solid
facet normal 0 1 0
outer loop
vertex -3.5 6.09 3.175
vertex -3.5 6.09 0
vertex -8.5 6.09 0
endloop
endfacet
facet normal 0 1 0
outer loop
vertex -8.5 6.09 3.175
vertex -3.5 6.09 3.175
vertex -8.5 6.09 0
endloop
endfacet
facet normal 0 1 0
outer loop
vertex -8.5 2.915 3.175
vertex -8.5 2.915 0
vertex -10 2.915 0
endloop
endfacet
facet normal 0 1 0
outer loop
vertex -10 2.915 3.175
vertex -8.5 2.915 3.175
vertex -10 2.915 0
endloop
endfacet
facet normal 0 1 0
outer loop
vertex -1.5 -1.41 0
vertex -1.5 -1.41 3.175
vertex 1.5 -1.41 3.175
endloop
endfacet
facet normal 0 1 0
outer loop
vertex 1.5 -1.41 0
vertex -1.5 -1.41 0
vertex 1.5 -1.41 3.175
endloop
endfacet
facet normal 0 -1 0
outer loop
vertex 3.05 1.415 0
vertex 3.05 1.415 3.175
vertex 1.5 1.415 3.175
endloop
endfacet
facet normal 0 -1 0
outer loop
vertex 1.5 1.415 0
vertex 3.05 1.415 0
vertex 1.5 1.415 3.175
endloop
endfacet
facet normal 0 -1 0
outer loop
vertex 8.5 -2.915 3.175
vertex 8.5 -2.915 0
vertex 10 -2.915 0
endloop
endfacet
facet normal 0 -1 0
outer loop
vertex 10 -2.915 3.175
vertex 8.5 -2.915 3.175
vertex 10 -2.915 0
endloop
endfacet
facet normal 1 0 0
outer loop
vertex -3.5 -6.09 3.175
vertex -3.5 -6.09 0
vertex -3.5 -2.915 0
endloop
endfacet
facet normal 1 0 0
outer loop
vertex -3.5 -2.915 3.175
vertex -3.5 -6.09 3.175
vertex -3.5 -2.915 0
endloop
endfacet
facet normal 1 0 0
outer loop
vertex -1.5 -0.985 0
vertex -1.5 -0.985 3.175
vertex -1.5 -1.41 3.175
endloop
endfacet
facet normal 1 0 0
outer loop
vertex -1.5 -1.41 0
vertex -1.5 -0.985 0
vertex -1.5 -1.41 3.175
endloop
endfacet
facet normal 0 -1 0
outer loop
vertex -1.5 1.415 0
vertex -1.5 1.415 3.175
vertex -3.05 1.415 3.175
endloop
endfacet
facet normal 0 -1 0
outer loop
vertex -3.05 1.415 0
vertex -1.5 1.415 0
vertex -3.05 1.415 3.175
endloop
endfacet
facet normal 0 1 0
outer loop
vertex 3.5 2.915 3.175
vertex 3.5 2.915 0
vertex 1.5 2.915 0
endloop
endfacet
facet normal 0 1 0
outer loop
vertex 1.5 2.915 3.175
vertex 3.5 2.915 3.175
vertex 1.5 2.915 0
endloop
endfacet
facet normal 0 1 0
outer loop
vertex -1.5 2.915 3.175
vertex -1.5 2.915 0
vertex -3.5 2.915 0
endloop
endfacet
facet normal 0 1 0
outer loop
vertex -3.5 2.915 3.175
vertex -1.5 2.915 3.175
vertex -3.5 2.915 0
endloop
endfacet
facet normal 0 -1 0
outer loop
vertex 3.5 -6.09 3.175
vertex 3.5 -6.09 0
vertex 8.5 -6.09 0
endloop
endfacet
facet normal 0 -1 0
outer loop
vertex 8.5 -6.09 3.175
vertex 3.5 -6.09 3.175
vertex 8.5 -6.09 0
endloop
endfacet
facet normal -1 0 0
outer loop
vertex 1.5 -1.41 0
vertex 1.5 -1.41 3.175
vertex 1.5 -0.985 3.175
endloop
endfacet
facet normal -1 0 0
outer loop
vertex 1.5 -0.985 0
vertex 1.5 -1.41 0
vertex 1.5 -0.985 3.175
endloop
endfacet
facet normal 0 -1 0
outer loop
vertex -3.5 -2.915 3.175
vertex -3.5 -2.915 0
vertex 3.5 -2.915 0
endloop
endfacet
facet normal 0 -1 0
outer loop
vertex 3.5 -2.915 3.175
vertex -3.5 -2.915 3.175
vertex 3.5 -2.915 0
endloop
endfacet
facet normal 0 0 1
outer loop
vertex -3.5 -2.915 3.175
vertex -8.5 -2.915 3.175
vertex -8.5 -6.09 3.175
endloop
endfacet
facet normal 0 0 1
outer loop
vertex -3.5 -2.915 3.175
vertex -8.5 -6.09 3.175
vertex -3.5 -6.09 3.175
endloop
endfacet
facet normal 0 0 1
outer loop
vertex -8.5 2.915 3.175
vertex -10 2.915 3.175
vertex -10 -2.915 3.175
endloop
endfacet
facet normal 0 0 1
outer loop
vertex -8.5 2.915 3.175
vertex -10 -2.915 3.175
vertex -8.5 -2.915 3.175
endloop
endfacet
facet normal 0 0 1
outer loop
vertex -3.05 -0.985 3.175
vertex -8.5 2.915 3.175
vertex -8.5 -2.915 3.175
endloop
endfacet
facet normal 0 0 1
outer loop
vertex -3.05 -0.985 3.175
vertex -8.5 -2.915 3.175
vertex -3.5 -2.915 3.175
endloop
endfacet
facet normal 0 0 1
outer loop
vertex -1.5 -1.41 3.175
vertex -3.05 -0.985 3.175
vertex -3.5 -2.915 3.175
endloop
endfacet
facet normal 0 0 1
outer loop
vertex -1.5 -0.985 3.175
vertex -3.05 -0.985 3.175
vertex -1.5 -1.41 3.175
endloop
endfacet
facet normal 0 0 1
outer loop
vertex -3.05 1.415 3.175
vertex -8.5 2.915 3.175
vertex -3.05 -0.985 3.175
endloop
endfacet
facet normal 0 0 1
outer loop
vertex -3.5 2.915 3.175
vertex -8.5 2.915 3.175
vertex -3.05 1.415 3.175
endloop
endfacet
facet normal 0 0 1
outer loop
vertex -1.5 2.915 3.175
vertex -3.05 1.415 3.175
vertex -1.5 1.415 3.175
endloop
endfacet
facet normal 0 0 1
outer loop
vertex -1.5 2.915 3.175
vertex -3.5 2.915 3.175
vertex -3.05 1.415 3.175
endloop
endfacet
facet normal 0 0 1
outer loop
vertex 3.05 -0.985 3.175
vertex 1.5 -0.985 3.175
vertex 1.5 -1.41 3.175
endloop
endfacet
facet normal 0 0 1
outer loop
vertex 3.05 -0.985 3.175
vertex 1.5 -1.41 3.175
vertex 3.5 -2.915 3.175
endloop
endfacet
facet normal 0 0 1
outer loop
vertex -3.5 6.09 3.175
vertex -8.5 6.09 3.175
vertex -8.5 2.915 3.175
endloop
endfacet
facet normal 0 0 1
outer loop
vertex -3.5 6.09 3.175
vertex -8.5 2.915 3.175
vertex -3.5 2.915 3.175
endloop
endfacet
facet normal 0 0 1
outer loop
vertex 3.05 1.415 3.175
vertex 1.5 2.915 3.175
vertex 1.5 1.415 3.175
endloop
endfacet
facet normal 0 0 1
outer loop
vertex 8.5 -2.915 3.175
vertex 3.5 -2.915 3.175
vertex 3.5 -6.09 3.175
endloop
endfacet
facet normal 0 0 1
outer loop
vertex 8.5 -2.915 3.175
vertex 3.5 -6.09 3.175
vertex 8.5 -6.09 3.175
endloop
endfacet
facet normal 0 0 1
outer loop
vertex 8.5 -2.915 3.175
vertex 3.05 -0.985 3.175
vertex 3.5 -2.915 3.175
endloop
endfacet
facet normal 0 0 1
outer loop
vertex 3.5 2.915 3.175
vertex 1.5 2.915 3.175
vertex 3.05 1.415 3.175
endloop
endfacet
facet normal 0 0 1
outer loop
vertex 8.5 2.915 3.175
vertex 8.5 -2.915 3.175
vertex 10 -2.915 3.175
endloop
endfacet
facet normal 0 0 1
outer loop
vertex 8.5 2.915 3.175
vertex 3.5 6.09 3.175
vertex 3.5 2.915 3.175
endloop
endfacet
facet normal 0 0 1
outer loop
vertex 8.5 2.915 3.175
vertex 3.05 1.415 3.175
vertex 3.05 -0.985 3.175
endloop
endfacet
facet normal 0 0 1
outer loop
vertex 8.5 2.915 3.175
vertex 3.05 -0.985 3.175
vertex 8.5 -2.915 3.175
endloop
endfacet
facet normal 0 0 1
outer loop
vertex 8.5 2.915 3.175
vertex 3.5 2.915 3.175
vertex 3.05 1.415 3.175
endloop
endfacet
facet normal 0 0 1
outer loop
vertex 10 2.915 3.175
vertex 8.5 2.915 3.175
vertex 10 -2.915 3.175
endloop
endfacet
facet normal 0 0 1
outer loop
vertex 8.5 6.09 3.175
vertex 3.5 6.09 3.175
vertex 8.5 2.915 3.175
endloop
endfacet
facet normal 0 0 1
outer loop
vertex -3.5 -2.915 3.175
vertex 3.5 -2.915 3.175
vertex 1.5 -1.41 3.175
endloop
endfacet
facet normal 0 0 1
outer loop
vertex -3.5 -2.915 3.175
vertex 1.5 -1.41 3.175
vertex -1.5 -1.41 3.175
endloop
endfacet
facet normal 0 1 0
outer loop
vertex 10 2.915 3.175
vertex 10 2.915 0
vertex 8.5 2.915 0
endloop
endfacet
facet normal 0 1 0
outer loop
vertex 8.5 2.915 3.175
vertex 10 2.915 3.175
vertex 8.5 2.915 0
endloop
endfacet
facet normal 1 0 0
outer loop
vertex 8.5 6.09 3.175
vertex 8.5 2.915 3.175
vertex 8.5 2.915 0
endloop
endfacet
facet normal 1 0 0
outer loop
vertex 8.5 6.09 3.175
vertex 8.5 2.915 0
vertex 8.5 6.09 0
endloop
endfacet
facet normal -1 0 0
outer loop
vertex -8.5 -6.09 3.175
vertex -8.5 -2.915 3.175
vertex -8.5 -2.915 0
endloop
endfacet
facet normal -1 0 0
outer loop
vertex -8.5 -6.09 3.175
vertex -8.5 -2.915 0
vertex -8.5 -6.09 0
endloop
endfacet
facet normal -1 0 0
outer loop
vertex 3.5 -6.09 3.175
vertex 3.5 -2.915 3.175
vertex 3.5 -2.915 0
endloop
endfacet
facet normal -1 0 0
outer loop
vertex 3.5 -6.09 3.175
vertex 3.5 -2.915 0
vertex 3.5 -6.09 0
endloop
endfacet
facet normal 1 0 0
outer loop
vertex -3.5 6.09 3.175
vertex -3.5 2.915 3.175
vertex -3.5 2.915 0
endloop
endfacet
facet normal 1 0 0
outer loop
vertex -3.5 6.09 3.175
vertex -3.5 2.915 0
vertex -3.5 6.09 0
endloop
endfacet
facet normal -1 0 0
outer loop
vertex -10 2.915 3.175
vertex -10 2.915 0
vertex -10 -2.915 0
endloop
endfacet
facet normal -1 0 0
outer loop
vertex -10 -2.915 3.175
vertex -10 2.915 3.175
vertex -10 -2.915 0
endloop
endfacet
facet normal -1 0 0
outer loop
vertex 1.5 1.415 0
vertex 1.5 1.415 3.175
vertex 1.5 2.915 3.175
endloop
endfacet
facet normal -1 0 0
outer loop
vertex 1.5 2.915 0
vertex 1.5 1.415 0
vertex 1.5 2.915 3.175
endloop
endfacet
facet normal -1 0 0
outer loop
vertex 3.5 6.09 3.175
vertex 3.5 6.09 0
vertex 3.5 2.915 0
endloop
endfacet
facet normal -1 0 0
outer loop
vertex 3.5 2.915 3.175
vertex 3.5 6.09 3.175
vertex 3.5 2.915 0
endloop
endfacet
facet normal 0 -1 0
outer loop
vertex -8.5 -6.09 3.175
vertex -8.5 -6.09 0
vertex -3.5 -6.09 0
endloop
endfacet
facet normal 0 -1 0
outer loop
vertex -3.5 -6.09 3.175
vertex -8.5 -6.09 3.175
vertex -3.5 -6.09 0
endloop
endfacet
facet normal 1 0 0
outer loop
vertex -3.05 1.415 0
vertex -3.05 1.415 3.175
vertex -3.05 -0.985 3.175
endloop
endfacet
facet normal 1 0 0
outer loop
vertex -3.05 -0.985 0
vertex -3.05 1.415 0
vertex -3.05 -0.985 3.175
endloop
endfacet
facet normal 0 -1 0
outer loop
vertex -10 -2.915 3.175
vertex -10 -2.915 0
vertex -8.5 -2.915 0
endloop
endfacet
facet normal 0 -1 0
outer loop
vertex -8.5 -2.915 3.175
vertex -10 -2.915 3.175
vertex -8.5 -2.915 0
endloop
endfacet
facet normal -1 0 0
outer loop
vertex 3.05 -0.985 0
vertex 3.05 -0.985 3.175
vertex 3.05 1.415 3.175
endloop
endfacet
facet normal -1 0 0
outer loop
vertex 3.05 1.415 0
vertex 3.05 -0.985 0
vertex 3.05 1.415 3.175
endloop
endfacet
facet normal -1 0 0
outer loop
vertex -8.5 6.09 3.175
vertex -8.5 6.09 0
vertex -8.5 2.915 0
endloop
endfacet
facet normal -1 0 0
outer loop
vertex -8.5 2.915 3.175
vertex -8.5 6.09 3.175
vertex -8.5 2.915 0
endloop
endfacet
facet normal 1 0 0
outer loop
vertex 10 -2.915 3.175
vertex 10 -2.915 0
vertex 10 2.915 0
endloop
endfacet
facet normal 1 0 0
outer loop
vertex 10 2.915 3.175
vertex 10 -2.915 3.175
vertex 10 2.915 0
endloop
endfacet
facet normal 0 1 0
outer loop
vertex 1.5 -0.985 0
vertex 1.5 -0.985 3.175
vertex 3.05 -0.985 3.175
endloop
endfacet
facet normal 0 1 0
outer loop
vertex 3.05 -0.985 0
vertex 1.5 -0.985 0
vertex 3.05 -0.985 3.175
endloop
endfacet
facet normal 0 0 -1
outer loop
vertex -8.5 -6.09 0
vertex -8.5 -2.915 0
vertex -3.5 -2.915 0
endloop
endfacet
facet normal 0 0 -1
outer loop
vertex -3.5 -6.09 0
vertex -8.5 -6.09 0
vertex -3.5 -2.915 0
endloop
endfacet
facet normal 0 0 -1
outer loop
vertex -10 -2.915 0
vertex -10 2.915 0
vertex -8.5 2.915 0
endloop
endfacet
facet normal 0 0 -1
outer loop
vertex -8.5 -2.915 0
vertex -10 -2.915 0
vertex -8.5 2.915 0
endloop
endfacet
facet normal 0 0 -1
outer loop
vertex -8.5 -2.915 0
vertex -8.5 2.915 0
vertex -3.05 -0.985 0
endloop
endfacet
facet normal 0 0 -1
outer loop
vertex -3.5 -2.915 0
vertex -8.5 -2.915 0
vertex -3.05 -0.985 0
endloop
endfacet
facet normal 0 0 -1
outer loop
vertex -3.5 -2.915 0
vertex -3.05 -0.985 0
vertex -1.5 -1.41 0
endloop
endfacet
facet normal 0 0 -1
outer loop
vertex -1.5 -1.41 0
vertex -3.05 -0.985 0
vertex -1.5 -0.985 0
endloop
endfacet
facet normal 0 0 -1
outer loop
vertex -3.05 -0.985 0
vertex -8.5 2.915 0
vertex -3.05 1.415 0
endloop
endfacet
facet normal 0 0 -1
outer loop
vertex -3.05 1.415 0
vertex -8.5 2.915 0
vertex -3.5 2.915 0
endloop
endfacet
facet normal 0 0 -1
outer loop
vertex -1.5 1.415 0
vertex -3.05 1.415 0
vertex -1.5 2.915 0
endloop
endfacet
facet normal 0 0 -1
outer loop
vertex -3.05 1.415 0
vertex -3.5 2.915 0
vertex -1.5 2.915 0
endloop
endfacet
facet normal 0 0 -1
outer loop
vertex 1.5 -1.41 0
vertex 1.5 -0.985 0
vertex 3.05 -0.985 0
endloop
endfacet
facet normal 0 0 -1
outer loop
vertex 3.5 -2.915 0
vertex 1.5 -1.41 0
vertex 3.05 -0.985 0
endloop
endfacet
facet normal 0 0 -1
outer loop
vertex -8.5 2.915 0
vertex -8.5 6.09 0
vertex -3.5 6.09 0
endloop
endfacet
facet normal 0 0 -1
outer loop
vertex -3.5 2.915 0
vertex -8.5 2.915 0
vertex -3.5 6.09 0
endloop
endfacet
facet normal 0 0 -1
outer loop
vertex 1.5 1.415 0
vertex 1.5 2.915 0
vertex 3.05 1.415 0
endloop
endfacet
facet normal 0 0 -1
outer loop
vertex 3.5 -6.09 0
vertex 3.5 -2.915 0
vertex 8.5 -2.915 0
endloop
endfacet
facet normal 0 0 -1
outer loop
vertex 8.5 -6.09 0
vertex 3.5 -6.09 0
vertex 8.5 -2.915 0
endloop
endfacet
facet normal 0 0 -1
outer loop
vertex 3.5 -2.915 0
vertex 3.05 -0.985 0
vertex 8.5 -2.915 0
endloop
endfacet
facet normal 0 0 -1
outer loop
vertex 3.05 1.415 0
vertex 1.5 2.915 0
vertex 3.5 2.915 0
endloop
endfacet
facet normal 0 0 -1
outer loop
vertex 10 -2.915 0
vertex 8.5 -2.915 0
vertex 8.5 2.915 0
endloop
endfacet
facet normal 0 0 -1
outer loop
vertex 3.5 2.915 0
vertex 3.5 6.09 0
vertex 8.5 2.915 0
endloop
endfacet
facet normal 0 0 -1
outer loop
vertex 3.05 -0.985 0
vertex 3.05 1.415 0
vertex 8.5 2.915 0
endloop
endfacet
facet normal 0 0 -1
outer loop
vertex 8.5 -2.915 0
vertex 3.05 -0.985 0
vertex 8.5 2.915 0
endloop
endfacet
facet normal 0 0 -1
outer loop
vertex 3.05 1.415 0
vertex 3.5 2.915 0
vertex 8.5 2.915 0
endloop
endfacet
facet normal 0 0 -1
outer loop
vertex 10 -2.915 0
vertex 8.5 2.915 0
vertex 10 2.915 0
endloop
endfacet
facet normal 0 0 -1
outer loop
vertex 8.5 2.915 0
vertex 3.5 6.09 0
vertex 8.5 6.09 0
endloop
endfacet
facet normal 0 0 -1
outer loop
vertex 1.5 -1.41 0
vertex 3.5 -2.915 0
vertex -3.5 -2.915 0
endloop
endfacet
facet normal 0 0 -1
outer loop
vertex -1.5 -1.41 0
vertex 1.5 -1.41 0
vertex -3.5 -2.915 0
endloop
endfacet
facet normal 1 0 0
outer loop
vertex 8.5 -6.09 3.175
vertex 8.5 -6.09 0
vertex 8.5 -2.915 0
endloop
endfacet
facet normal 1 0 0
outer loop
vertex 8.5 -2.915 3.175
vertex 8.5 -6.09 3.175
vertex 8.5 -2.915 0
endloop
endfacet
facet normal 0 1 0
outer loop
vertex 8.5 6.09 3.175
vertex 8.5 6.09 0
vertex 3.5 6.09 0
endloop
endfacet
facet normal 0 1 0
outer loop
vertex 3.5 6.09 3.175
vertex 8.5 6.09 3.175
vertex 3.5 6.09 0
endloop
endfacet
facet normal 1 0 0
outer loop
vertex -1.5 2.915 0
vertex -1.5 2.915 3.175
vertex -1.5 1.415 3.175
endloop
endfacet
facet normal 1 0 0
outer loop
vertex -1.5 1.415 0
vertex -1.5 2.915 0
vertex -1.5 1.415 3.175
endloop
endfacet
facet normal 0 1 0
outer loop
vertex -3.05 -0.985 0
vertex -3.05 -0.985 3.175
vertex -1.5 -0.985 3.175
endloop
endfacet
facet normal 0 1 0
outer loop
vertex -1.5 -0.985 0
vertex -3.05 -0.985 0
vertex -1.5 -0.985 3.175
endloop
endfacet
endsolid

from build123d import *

# Parameters (mm, degrees)
BOSS_EXTRUDE1_DEPTH = 3.175
CUT_EXTRUDE1_DEPTH  = 13.131311759


with BuildPart() as part:
    # Sketch1 → Boss-Extrude1 (new body)
    with BuildSketch(Plane.XY):
        Polygon((-10, 2.915), (-10, -2.915), (-8.5, -2.915), (-8.5, -6.09), (-3.5, -6.09), (-3.5, -2.915), (3.5, -2.915), (3.5, -6.09), (8.5, -6.09), (8.5, -2.915), (10, -2.915), (10, 2.915), (8.5, 2.915), (8.5, 6.09), (3.5, 6.09), (3.5, 2.915), (-3.5, 2.915), (-3.5, 6.09), (-8.5, 6.09), (-8.5, 2.915), align=None)
    extrude(amount=BOSS_EXTRUDE1_DEPTH)

    # Sketch2 → Cut-Extrude1 (cut, through all)
    with BuildSketch(Plane.XY.offset(3.175)):
        Polygon((-1.5, 2.915), (-1.5, 1.415), (-3.05, 1.415), (-3.05, -0.985), (-1.5, -0.985), (-1.5, -1.41), (1.5, -1.41), (1.5, -0.985), (3.05, -0.985), (3.05, 1.415), (1.5, 1.415), (1.5, 2.915), align=None)
    extrude(amount=-CUT_EXTRUDE1_DEPTH, mode=Mode.SUBTRACT)


solid = part.part
